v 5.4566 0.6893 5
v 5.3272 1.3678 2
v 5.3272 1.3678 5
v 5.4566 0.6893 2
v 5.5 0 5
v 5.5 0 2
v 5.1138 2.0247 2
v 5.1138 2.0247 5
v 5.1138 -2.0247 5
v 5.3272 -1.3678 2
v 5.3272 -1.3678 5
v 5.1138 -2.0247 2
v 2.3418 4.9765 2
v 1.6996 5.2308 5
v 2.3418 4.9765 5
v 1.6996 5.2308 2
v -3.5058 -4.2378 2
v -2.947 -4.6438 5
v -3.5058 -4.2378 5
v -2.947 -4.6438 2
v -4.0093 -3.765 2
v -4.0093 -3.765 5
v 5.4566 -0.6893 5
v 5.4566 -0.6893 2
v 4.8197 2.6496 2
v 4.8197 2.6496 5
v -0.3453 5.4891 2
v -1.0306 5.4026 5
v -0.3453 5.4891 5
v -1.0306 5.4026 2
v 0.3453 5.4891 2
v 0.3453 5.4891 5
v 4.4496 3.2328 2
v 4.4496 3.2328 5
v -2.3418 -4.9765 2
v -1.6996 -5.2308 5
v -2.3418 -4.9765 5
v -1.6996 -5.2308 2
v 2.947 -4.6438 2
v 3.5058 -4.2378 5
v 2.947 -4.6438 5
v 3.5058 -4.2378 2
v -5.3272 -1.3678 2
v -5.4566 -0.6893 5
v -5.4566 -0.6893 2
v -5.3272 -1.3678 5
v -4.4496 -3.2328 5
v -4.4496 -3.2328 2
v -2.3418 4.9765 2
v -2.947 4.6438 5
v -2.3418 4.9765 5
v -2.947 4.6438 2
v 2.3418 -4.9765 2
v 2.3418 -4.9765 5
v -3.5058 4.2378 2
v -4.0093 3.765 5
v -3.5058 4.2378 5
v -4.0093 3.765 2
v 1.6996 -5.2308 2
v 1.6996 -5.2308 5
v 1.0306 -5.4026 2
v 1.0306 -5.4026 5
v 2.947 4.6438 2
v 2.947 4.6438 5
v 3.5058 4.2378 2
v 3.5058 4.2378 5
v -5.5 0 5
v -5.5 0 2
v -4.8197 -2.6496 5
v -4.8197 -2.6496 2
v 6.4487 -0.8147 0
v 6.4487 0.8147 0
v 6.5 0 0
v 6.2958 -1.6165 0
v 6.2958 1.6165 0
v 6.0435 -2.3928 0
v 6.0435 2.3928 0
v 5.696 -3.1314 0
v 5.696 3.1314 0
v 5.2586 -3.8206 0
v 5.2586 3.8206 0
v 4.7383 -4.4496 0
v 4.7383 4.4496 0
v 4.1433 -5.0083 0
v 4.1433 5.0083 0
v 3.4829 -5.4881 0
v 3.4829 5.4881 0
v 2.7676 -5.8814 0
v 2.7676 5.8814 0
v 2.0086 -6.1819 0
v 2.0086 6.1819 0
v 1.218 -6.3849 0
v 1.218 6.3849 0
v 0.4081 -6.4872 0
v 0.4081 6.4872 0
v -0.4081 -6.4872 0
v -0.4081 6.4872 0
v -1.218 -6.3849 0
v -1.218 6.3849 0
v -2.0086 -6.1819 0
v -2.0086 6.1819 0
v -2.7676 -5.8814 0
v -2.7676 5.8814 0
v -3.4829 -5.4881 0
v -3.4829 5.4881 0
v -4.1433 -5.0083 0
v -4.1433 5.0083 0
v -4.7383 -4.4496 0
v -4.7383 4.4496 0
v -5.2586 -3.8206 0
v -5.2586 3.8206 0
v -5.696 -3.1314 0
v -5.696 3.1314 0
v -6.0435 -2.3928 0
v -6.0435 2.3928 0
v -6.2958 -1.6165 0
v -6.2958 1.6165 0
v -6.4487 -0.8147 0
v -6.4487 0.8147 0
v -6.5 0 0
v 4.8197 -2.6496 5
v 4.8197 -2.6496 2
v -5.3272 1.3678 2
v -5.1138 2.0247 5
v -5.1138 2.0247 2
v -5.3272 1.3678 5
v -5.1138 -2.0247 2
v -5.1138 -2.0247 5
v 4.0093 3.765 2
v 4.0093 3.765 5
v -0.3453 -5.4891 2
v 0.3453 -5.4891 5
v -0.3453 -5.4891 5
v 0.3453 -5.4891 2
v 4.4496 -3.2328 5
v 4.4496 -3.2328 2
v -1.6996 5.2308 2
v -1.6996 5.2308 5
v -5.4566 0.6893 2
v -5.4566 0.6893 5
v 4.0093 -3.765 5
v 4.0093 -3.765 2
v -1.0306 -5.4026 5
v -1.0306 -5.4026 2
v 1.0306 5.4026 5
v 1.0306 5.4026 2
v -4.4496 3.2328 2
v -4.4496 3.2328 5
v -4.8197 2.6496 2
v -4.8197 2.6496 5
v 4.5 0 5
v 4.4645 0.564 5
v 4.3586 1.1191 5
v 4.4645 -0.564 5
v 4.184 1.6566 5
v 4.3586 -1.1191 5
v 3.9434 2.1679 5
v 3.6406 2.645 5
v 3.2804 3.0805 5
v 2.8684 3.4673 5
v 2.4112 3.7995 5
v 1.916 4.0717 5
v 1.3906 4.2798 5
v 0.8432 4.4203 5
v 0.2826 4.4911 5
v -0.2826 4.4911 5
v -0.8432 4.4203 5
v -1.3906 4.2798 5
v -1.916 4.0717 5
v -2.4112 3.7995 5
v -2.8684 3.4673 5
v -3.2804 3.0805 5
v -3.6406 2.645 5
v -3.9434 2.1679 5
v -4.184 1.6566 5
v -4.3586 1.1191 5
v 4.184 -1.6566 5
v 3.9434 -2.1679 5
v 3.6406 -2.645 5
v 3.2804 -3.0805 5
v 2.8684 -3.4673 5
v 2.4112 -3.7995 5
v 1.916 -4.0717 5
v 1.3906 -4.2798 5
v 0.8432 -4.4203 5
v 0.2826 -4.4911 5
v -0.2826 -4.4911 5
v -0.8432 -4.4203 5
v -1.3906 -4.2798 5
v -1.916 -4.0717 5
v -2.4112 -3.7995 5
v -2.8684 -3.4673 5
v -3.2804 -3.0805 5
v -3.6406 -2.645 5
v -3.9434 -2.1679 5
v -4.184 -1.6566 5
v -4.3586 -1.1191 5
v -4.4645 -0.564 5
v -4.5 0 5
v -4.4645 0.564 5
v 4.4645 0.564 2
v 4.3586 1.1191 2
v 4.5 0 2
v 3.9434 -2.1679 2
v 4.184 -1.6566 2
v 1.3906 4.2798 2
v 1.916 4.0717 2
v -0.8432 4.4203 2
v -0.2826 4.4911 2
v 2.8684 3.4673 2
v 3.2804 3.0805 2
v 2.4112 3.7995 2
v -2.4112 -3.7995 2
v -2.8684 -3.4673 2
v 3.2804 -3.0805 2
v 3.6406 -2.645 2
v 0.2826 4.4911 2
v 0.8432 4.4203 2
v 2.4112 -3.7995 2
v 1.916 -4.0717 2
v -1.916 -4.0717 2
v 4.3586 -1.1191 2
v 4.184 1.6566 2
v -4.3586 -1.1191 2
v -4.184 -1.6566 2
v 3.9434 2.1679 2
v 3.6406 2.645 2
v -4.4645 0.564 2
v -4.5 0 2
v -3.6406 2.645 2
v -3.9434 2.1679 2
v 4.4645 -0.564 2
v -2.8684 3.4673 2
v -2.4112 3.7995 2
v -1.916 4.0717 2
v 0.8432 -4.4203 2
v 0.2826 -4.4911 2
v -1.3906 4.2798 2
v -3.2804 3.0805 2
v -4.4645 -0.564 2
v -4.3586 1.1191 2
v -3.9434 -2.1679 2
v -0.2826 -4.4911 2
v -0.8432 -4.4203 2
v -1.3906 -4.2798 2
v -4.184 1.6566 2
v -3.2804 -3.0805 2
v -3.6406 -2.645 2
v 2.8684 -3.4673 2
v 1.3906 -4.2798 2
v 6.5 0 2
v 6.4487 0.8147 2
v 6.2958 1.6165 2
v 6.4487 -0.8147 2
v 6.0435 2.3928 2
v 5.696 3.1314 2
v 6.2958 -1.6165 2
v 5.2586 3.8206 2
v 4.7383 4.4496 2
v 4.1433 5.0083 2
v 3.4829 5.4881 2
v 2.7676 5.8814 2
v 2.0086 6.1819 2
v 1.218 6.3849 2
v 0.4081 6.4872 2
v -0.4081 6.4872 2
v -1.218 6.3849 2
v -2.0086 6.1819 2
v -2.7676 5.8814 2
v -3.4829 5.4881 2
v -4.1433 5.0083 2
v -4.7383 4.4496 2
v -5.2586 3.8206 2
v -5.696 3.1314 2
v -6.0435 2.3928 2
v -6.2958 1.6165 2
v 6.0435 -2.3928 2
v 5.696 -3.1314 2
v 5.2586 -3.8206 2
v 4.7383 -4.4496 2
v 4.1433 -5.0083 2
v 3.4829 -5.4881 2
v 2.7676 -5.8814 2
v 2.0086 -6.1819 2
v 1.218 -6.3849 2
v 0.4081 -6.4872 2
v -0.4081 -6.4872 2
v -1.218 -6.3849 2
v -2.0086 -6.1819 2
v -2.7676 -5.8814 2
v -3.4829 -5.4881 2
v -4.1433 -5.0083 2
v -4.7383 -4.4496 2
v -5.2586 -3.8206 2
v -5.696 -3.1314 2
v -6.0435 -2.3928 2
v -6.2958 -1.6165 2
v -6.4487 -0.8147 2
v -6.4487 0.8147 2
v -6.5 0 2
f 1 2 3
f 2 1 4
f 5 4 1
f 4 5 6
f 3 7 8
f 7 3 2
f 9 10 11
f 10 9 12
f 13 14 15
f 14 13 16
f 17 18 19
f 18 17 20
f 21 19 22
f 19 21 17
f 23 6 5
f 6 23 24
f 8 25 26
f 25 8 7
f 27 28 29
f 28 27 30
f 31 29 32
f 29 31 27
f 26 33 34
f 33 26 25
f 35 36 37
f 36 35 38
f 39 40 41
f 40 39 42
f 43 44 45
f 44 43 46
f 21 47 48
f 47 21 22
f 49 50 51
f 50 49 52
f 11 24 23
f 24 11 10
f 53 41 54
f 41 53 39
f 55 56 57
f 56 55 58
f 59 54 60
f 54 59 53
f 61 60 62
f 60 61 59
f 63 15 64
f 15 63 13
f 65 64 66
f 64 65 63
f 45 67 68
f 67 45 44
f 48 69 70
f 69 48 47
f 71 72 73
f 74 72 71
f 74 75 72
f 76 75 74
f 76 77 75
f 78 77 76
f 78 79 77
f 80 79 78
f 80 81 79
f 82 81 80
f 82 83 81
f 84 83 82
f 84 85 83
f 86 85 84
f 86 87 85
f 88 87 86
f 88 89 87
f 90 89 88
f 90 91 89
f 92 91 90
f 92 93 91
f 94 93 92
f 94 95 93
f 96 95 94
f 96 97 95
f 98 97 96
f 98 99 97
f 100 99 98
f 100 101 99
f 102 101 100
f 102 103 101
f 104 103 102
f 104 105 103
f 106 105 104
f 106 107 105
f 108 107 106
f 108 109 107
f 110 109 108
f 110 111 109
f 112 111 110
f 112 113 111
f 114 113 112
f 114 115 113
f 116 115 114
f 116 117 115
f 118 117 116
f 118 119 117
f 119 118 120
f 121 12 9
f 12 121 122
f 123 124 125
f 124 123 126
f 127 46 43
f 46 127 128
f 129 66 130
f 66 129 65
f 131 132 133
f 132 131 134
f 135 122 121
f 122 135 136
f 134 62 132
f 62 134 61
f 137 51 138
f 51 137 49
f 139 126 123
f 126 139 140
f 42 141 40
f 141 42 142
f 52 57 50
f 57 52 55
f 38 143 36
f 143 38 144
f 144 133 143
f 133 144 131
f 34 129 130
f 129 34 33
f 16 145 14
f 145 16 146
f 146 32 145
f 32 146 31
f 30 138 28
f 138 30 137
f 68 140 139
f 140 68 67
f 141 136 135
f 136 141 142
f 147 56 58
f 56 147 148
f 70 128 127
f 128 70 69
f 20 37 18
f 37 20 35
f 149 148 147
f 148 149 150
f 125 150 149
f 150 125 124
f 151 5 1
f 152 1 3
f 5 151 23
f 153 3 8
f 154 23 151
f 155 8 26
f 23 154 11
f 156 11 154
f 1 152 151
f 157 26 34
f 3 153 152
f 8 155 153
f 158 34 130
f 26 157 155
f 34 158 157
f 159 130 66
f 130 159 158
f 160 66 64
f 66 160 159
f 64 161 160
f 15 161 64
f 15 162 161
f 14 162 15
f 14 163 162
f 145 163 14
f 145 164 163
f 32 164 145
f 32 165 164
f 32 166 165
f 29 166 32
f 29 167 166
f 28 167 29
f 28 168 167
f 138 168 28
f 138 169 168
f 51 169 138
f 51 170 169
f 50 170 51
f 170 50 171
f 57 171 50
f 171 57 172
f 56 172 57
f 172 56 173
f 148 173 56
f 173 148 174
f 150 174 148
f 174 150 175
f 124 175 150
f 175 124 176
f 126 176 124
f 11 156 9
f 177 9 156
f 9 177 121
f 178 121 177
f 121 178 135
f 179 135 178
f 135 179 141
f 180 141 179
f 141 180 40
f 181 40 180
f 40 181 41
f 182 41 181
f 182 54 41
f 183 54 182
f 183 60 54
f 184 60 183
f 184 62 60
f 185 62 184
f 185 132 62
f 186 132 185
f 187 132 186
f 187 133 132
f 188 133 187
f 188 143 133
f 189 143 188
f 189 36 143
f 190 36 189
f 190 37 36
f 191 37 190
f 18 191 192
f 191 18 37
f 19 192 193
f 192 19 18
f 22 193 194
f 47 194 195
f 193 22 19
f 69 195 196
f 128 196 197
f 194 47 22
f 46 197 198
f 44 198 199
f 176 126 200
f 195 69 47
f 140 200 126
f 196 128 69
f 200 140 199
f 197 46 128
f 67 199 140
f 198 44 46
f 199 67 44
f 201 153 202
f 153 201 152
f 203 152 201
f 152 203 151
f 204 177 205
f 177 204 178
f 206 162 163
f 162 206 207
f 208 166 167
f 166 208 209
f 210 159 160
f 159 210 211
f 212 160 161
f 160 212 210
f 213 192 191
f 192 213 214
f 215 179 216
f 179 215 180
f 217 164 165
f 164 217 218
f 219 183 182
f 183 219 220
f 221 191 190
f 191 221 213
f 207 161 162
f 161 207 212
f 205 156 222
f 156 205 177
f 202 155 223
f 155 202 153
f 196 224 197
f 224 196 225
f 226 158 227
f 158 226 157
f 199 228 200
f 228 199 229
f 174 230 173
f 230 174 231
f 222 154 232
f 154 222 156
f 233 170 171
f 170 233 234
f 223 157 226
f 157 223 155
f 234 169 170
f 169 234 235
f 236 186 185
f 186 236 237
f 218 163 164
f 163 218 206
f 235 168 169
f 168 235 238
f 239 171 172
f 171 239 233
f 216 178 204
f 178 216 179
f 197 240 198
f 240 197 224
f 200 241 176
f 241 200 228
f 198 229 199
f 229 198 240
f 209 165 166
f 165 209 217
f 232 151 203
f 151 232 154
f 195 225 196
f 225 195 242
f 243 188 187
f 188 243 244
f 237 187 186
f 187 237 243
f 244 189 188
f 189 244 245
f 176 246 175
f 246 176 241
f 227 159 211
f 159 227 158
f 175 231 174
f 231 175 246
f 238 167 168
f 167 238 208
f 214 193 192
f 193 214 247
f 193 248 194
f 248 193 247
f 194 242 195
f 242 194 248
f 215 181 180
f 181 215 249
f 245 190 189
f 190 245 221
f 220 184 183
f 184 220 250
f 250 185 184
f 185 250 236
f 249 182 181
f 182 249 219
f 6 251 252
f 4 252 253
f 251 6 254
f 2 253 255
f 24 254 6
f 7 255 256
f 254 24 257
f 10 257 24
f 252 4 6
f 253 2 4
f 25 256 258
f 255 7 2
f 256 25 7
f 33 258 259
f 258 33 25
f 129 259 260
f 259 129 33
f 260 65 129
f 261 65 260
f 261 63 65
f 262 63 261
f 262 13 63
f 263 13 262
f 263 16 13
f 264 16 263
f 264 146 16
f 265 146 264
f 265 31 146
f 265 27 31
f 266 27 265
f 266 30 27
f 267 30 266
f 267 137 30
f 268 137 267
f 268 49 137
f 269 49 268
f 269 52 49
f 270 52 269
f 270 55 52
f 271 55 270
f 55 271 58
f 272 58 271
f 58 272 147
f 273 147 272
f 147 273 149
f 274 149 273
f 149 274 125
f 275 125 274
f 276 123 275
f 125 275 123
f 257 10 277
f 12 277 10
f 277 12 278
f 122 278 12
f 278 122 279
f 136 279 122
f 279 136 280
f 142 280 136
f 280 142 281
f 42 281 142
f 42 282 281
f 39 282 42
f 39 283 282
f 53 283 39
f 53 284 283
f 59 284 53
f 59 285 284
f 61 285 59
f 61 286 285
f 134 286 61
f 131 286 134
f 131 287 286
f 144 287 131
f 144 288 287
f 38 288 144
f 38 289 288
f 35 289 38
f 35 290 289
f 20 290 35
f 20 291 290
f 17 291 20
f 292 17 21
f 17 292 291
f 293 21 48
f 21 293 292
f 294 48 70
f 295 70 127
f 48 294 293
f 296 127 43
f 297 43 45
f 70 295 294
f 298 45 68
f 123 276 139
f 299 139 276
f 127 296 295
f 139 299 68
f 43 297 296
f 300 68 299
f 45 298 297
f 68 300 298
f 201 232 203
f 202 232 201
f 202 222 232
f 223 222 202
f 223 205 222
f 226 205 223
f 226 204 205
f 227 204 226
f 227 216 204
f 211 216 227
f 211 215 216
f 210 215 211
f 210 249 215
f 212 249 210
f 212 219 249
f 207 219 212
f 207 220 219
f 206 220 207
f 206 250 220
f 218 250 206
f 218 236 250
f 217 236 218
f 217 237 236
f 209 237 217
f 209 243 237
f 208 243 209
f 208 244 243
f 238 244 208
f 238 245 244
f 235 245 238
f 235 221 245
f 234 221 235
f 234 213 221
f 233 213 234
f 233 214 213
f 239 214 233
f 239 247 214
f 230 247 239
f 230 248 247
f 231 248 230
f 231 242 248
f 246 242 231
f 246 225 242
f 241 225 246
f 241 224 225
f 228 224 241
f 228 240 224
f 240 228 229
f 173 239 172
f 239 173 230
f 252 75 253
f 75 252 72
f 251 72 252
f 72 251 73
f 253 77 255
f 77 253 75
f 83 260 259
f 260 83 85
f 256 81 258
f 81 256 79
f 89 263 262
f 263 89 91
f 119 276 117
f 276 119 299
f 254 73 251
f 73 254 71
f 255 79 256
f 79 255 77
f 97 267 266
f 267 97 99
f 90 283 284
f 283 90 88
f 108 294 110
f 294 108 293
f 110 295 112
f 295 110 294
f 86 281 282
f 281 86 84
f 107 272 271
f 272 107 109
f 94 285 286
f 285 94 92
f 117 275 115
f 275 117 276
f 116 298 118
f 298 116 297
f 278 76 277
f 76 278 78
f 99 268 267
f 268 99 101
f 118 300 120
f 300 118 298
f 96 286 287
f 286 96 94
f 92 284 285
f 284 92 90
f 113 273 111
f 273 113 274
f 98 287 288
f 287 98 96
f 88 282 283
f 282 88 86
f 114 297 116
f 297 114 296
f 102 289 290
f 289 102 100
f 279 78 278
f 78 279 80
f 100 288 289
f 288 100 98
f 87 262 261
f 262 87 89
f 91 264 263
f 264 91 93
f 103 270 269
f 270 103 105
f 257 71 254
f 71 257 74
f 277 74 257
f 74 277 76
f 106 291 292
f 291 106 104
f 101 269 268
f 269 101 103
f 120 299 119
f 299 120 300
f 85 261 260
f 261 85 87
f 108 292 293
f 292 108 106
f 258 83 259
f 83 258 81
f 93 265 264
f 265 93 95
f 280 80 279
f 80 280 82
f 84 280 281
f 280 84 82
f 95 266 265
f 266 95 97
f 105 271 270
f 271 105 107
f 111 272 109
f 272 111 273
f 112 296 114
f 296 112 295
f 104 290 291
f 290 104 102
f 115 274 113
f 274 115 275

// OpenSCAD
// file: ../../../../modules/scad/roundedcube.scad
// More information: https://danielupshaw.com/openscad-rounded-corners/


// Examples
// color("Yellow")
// roundedcube(3, true, 0.7, "xmin");

// translate(v = [1, 0, 2])
// color("Pink")
// roundedcube([4, 2, 2], false, 0.6, "zmax");

// translate(v = [-4, -1, 2])
// color("Lightblue")
// roundedcube(2, false);

// translate(v = [0, 0, 6])
// color("Orange")
// roundedcube([3, 2, 2], true, 0.2);

// translate(v = [2.5, -0.5, 5])
// color("Green")
// roundedcube([3, 2, 2], false, 0.4, "z");

// Set to 0.01 for higher definition curves (renders slower)
$fs = 0.15;

module roundedcube(size = [1, 1, 1], center = false, radius = 0.5, apply_to = "all") {
	// If single value, convert to [x, y, z] vector
	size = (size[0] == undef) ? [size, size, size] : size;

	translate_min = radius;
	translate_xmax = size[0] - radius;
	translate_ymax = size[1] - radius;
	translate_zmax = size[2] - radius;

	diameter = radius * 2;

	obj_translate = (center == false) ?
		[0, 0, 0] : [
			-(size[0] / 2),
			-(size[1] / 2),
			-(size[2] / 2)
		];

	translate(v = obj_translate) {
		hull() {
			for (translate_x = [translate_min, translate_xmax]) {
				x_at = (translate_x == translate_min) ? "min" : "max";
				for (translate_y = [translate_min, translate_ymax]) {
					y_at = (translate_y == translate_min) ? "min" : "max";
					for (translate_z = [translate_min, translate_zmax]) {
						z_at = (translate_z == translate_min) ? "min" : "max";

						translate(v = [translate_x, translate_y, translate_z])
						if (
							(apply_to == "all") ||
							(apply_to == "xmin" && x_at == "min") || (apply_to == "xmax" && x_at == "max") ||
							(apply_to == "ymin" && y_at == "min") || (apply_to == "ymax" && y_at == "max") ||
							(apply_to == "zmin" && z_at == "min") || (apply_to == "zmax" && z_at == "max")
						) {
							sphere(r = radius);
						} else {
							rotate = 
								(apply_to == "xmin" || apply_to == "xmax" || apply_to == "x") ? [0, 90, 0] : (
								(apply_to == "ymin" || apply_to == "ymax" || apply_to == "y") ? [90, 90, 0] :
								[0, 0, 0]
							);
							rotate(a = rotate)
							cylinder(h = diameter, r = radius, center = true);
						}
					}
				}
			}
		}
	}
}
// file: IKEA Skadis v3 hook.scad
$fn=20;

sh_height=43;
sh_width=4.5;
sh_hanger_spacing=5.5;
sh_material_size=2;
sh_short_tail=4;
sh_corner_radius = 0.8;

use <../../../../modules/scad/roundedcube.scad>

module ikea_skadis_holder() {
    difference() {
        union() {
            
            //Vertical wall
            color("green")
            roundedcube(size = [sh_width,sh_material_size,sh_height], center = false, radius = sh_corner_radius, apply_to = "ymax");
            //cube([sh_width,sh_material_size,sh_height]);
            
            // Retainer
            color("blue")
            translate([0,0,sh_height-sh_hanger_spacing])
            roundedcube(size = [sh_width, sh_hanger_spacing + sh_material_size * 2 + 1, sh_hanger_spacing + 3], center = false, radius = sh_corner_radius, apply_to = "ymax");

            //Vertical wall connection (short)
            color("cyan")
            translate([0, sh_hanger_spacing + sh_material_size , sh_height - sh_hanger_spacing])
            roundedcube(size = [sh_width, sh_material_size + 1, 2], center = false, radius = sh_corner_radius, apply_to = "z");

            //Vertical wall (short)
            color("cyan")
            translate([0, sh_hanger_spacing + sh_material_size , sh_height - sh_short_tail - sh_hanger_spacing])
            //cube([sh_width,sh_material_size+1,sh_short_tail]);
            roundedcube(size = [sh_width, sh_material_size + 1, sh_short_tail], center = false, radius = sh_corner_radius, apply_to = "zmin");

            //Schnöpsel
            color("yellow")
            translate([0, sh_material_size - 2, 0])
            roundedcube(size = [sh_width, sh_hanger_spacing + 2, 8], center = false, radius = sh_corner_radius + 0.8, apply_to = "ymax");

            //Schnöpsel - Angleichen des unteren radius
            color("yellow")
            translate([0, sh_material_size - 2, 0])
            roundedcube(size = [sh_width, sh_hanger_spacing + 2, 7], center = false, radius = sh_corner_radius, apply_to = "ymax");

        }
        
        
    color("red")
    translate([-1,sh_material_size+sh_hanger_spacing/2,sh_height-sh_hanger_spacing])
    rotate([0,90,0])
    cylinder(sh_width+2, sh_hanger_spacing/2, sh_hanger_spacing/2);
        
    }
}

ikea_skadis_holder();
// main file
use <./IKEA Skadis v3 hook.scad>

$fn = 50;

_size = 60;
_rod_dia = 9;
_height = 7;
_round = 3; // corner rounding radius
_wall  = 5; // wall thickness for hollow cutout

module rod_holder() {

    color("lightgreen")
    translate([2, _size - 56, 4.5])
    rotate([270, 90, 0])
    ikea_skadis_holder();

    difference() {
        translate([0, 0, _height / 2])
        linear_extrude(height = _height, center = true)
            offset(r = _round, $fn = 40) offset(r = -_round)
            polygon(points = [
                [0, 0],  
                [0, _size],
                [5, _size],
                [5, _size - 10],
                [(_size - 5) / 2, _size - 20],
                [_size, _size - 10],
                [_size, _size - 5],
                [_size + _rod_dia + 6, _size - 5],
                [_size + _rod_dia + 6, _size - 20],
                [10, 0],
            ]);

        // Hollow inner cutout with uniform wall thickness,
        // but keep walls around the rod slot
        translate([0, 0, _height / 2])
        linear_extrude(height = _height + 1, center = true)
            difference() {
                offset(r = _round - _wall, $fn = 40) offset(r = -(_round - _wall))
                offset(r = -_wall)
                polygon(points = [
                    [0, 0],  
                    [0, _size],
                    [5, _size],
                    [5, _size - 10],
                    [(_size - 5) / 2, _size - 20],
                    [_size, _size - 10],
                    [_size, _size - 5],
                    [_size + _rod_dia + 6, _size - 5],
                    [_size + _rod_dia + 6, _size - 20],
                    [10, 0],
                ]);
                // Exclude the rod slot footprint + wall buffer so walls stay intact
                offset(r = _wall, $fn = 20)
                hull() {
                    translate([_size + _rod_dia / 2 + 3, _size - 5])  circle(d = _rod_dia);
                    translate([_size + _rod_dia / 2 + 3, _size - 10]) circle(d = _rod_dia);
                }
            }

        color("red")
        hull() {
            translate([_size + _rod_dia / 2 + 3, _size - 5, _height / 2])
            cylinder(h = _height + 2, d = _rod_dia, center = true);
            translate([_size + _rod_dia / 2 + 3, _size - 10, _height / 2])
            cylinder(h = _height + 2, d = _rod_dia, center = true);
        }
    }
}

module rod_endcaps() {

        color("lightblue")
        translate([0,0,0])
        cylinder(h = 2, d = _rod_dia + 4, center = false);    
    
    difference() {

        color("lightblue")
        translate([0,0,0])
        cylinder(h = 5, d = _rod_dia + 2, center = false);
        translate([0,0,2])
        cylinder(h = 4, d = _rod_dia, center = false);
    }
}

rod_endcaps();
